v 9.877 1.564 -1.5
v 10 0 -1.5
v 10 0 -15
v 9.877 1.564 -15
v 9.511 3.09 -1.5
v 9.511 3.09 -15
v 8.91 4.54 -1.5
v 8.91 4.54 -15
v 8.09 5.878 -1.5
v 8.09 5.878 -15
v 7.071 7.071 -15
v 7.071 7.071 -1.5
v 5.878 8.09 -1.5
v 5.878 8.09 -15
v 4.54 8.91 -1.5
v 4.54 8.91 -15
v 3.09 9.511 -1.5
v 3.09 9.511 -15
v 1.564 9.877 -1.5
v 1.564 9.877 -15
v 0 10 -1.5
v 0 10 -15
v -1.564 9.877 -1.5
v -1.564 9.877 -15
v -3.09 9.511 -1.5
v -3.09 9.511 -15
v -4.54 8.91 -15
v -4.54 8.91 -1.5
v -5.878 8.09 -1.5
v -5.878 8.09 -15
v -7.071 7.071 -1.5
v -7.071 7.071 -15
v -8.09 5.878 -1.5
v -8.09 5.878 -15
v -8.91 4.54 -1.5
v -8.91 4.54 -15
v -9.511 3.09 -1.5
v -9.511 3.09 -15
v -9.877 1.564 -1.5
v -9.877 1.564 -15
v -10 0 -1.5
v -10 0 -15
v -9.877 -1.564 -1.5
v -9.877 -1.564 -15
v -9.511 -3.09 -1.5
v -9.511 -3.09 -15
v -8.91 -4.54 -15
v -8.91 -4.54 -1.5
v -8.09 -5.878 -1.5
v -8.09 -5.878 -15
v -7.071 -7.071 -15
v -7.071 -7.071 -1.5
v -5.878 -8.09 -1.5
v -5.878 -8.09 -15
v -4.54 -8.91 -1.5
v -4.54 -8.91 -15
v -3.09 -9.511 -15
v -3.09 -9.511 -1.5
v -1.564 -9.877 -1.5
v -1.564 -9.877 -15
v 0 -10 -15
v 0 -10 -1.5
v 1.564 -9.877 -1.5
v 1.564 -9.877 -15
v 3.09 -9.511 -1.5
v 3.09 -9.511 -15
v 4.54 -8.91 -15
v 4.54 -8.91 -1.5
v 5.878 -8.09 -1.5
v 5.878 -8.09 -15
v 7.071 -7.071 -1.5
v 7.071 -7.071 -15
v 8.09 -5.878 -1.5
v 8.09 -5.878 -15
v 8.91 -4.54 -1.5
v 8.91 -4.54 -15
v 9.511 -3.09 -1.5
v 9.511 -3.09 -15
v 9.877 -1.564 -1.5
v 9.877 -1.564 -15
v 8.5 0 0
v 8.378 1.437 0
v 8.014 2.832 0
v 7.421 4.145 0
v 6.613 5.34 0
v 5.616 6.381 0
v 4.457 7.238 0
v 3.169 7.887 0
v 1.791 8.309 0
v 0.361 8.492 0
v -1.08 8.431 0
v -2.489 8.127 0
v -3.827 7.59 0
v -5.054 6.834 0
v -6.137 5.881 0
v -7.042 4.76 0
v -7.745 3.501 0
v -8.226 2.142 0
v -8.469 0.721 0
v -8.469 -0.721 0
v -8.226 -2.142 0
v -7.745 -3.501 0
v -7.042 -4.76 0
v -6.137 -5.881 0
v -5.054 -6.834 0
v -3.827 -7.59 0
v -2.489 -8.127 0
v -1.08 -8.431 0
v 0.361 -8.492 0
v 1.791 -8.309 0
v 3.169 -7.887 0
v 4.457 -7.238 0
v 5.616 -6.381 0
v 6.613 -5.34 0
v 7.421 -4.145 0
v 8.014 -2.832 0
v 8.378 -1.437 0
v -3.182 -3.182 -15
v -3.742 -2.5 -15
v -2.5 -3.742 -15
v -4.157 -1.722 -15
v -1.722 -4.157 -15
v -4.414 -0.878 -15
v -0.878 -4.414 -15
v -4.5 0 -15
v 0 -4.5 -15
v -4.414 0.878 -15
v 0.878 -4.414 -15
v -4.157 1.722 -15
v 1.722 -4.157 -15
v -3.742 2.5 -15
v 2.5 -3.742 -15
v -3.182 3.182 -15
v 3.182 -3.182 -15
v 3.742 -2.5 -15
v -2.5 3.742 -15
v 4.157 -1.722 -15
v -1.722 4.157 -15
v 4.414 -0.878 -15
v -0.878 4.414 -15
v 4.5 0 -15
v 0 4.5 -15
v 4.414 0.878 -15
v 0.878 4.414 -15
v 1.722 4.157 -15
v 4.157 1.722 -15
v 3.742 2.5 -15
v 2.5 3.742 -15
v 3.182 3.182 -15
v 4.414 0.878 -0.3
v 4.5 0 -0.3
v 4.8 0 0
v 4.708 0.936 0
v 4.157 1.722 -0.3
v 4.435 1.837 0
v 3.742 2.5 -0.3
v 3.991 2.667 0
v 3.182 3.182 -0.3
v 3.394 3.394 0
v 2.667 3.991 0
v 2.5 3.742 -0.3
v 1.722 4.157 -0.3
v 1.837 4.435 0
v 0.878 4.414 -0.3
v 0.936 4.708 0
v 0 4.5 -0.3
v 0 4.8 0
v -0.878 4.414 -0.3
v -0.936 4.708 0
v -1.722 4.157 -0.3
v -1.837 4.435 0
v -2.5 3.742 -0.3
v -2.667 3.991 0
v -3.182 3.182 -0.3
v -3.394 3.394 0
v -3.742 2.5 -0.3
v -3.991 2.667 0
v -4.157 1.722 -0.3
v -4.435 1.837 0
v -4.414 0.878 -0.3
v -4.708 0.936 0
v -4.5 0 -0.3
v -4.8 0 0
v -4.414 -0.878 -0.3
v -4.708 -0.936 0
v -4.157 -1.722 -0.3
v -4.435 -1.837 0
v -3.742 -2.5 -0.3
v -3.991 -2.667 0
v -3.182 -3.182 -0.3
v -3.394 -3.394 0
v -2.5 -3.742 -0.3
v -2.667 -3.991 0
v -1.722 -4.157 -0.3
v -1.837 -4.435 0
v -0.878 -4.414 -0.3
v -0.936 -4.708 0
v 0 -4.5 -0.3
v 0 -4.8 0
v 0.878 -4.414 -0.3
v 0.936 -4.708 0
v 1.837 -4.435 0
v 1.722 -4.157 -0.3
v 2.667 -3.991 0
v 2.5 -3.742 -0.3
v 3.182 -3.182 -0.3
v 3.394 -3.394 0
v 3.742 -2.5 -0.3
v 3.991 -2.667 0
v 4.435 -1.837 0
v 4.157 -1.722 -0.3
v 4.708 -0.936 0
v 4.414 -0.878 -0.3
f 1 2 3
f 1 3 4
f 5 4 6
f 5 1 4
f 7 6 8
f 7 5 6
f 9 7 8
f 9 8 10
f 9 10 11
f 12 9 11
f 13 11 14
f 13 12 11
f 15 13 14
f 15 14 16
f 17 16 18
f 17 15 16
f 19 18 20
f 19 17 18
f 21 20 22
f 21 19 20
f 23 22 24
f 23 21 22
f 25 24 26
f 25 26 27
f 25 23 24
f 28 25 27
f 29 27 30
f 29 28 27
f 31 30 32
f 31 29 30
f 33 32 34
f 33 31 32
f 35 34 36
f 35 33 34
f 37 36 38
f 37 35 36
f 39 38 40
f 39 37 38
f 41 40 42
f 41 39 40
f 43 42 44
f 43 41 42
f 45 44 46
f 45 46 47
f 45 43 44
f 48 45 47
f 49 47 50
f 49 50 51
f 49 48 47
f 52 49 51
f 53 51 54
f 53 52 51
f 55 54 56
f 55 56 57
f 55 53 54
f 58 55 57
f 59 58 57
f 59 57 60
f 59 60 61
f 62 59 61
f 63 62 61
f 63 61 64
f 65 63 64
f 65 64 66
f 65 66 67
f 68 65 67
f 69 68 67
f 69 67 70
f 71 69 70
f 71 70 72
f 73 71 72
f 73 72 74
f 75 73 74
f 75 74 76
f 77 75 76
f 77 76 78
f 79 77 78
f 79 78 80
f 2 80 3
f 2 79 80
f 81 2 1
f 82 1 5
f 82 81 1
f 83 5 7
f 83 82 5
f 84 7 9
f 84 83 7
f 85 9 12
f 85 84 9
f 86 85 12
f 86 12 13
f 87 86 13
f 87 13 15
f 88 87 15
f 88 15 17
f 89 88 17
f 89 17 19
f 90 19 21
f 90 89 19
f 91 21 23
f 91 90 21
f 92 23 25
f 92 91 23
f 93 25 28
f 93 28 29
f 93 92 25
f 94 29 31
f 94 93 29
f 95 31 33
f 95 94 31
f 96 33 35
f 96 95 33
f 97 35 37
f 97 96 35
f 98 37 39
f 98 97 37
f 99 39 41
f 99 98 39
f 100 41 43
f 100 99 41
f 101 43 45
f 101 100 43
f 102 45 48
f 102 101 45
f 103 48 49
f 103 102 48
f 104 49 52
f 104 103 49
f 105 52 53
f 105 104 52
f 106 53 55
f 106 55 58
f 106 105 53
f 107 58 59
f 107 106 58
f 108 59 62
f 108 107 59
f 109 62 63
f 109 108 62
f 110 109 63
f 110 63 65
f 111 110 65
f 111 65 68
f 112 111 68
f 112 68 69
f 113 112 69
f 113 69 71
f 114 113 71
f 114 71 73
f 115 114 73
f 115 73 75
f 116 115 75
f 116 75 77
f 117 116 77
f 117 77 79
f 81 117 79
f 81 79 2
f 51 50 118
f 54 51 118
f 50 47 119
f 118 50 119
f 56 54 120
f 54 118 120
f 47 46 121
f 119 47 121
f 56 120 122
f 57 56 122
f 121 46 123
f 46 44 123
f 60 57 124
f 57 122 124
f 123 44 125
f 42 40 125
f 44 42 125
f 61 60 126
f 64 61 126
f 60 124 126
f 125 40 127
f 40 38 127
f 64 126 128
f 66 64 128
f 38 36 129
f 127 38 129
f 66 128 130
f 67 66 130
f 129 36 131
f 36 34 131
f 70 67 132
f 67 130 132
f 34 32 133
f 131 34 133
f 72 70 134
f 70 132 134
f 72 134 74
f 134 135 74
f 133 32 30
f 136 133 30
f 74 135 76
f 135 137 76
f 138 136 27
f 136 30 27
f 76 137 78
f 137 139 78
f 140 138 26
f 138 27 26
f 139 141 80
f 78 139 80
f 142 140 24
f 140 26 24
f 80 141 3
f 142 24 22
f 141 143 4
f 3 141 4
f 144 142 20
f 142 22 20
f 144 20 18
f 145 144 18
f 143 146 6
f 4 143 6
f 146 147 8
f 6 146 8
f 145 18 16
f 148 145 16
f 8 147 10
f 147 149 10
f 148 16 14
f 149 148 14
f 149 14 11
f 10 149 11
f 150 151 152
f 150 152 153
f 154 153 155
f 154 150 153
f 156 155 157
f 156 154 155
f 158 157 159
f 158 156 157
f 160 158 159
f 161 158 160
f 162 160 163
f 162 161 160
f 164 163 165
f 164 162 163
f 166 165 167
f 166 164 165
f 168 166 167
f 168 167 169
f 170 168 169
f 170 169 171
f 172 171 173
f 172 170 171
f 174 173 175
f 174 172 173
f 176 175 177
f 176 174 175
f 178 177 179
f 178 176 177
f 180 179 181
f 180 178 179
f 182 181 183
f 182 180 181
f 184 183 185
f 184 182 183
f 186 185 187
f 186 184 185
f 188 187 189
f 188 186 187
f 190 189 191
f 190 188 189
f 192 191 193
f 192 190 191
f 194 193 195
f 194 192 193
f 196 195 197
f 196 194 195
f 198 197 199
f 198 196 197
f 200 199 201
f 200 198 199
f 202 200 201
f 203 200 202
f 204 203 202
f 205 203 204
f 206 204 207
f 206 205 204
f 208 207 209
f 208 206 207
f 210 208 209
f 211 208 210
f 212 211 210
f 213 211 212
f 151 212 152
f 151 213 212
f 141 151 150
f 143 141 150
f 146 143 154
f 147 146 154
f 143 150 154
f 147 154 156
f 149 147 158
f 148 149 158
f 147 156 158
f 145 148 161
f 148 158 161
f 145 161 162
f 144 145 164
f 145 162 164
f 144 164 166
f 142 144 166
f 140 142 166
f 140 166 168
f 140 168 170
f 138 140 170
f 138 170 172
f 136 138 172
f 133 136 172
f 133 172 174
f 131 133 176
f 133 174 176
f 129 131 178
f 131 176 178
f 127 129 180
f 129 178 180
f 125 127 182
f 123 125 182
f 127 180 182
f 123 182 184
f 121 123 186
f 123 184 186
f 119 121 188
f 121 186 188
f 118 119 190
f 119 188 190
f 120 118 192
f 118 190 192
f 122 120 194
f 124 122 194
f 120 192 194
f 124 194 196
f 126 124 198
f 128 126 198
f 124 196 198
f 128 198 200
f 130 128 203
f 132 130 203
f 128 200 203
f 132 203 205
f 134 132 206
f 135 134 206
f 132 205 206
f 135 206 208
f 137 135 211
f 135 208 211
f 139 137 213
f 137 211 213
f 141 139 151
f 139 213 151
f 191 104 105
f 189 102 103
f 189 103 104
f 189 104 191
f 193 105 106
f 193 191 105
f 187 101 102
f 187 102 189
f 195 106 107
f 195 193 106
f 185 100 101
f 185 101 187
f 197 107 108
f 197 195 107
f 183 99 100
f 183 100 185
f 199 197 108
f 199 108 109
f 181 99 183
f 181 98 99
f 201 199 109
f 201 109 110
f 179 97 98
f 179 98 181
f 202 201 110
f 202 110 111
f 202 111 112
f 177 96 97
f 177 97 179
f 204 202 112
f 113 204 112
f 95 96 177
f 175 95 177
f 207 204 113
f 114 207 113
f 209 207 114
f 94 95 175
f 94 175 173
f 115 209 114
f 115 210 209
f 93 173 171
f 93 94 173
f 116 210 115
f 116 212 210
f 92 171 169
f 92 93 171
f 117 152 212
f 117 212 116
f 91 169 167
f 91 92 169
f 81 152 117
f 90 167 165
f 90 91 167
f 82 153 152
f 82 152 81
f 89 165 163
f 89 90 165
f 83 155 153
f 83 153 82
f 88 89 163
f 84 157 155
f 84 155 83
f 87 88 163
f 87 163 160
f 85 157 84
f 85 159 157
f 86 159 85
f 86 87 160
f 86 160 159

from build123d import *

# Parameters (mm, degrees)
F0_R     = 10
F0_R_2   = 4.5
F1_DEPTH = 15
F2_SIZE  = 1.5
F3_SIZE  = 0.3


with BuildPart() as f1:
    # F0 (on Top) → F1 (new body)
    with BuildSketch(Plane.XY):
        Circle(F0_R)
        Circle(F0_R_2, mode=Mode.SUBTRACT)
    extrude(amount=-F1_DEPTH)

    # F2
    f2_edges = [f1.edges().sort_by_distance(p)[0] for p in [
        (-10, 0, 0),
    ]]
    chamfer(f2_edges, length=F2_SIZE)

    # F3
    f3_edges = [f1.edges().sort_by_distance(p)[0] for p in [
        (-4.5, 0, 0),
    ]]
    chamfer(f3_edges, length=F3_SIZE)


solid = f1.part
